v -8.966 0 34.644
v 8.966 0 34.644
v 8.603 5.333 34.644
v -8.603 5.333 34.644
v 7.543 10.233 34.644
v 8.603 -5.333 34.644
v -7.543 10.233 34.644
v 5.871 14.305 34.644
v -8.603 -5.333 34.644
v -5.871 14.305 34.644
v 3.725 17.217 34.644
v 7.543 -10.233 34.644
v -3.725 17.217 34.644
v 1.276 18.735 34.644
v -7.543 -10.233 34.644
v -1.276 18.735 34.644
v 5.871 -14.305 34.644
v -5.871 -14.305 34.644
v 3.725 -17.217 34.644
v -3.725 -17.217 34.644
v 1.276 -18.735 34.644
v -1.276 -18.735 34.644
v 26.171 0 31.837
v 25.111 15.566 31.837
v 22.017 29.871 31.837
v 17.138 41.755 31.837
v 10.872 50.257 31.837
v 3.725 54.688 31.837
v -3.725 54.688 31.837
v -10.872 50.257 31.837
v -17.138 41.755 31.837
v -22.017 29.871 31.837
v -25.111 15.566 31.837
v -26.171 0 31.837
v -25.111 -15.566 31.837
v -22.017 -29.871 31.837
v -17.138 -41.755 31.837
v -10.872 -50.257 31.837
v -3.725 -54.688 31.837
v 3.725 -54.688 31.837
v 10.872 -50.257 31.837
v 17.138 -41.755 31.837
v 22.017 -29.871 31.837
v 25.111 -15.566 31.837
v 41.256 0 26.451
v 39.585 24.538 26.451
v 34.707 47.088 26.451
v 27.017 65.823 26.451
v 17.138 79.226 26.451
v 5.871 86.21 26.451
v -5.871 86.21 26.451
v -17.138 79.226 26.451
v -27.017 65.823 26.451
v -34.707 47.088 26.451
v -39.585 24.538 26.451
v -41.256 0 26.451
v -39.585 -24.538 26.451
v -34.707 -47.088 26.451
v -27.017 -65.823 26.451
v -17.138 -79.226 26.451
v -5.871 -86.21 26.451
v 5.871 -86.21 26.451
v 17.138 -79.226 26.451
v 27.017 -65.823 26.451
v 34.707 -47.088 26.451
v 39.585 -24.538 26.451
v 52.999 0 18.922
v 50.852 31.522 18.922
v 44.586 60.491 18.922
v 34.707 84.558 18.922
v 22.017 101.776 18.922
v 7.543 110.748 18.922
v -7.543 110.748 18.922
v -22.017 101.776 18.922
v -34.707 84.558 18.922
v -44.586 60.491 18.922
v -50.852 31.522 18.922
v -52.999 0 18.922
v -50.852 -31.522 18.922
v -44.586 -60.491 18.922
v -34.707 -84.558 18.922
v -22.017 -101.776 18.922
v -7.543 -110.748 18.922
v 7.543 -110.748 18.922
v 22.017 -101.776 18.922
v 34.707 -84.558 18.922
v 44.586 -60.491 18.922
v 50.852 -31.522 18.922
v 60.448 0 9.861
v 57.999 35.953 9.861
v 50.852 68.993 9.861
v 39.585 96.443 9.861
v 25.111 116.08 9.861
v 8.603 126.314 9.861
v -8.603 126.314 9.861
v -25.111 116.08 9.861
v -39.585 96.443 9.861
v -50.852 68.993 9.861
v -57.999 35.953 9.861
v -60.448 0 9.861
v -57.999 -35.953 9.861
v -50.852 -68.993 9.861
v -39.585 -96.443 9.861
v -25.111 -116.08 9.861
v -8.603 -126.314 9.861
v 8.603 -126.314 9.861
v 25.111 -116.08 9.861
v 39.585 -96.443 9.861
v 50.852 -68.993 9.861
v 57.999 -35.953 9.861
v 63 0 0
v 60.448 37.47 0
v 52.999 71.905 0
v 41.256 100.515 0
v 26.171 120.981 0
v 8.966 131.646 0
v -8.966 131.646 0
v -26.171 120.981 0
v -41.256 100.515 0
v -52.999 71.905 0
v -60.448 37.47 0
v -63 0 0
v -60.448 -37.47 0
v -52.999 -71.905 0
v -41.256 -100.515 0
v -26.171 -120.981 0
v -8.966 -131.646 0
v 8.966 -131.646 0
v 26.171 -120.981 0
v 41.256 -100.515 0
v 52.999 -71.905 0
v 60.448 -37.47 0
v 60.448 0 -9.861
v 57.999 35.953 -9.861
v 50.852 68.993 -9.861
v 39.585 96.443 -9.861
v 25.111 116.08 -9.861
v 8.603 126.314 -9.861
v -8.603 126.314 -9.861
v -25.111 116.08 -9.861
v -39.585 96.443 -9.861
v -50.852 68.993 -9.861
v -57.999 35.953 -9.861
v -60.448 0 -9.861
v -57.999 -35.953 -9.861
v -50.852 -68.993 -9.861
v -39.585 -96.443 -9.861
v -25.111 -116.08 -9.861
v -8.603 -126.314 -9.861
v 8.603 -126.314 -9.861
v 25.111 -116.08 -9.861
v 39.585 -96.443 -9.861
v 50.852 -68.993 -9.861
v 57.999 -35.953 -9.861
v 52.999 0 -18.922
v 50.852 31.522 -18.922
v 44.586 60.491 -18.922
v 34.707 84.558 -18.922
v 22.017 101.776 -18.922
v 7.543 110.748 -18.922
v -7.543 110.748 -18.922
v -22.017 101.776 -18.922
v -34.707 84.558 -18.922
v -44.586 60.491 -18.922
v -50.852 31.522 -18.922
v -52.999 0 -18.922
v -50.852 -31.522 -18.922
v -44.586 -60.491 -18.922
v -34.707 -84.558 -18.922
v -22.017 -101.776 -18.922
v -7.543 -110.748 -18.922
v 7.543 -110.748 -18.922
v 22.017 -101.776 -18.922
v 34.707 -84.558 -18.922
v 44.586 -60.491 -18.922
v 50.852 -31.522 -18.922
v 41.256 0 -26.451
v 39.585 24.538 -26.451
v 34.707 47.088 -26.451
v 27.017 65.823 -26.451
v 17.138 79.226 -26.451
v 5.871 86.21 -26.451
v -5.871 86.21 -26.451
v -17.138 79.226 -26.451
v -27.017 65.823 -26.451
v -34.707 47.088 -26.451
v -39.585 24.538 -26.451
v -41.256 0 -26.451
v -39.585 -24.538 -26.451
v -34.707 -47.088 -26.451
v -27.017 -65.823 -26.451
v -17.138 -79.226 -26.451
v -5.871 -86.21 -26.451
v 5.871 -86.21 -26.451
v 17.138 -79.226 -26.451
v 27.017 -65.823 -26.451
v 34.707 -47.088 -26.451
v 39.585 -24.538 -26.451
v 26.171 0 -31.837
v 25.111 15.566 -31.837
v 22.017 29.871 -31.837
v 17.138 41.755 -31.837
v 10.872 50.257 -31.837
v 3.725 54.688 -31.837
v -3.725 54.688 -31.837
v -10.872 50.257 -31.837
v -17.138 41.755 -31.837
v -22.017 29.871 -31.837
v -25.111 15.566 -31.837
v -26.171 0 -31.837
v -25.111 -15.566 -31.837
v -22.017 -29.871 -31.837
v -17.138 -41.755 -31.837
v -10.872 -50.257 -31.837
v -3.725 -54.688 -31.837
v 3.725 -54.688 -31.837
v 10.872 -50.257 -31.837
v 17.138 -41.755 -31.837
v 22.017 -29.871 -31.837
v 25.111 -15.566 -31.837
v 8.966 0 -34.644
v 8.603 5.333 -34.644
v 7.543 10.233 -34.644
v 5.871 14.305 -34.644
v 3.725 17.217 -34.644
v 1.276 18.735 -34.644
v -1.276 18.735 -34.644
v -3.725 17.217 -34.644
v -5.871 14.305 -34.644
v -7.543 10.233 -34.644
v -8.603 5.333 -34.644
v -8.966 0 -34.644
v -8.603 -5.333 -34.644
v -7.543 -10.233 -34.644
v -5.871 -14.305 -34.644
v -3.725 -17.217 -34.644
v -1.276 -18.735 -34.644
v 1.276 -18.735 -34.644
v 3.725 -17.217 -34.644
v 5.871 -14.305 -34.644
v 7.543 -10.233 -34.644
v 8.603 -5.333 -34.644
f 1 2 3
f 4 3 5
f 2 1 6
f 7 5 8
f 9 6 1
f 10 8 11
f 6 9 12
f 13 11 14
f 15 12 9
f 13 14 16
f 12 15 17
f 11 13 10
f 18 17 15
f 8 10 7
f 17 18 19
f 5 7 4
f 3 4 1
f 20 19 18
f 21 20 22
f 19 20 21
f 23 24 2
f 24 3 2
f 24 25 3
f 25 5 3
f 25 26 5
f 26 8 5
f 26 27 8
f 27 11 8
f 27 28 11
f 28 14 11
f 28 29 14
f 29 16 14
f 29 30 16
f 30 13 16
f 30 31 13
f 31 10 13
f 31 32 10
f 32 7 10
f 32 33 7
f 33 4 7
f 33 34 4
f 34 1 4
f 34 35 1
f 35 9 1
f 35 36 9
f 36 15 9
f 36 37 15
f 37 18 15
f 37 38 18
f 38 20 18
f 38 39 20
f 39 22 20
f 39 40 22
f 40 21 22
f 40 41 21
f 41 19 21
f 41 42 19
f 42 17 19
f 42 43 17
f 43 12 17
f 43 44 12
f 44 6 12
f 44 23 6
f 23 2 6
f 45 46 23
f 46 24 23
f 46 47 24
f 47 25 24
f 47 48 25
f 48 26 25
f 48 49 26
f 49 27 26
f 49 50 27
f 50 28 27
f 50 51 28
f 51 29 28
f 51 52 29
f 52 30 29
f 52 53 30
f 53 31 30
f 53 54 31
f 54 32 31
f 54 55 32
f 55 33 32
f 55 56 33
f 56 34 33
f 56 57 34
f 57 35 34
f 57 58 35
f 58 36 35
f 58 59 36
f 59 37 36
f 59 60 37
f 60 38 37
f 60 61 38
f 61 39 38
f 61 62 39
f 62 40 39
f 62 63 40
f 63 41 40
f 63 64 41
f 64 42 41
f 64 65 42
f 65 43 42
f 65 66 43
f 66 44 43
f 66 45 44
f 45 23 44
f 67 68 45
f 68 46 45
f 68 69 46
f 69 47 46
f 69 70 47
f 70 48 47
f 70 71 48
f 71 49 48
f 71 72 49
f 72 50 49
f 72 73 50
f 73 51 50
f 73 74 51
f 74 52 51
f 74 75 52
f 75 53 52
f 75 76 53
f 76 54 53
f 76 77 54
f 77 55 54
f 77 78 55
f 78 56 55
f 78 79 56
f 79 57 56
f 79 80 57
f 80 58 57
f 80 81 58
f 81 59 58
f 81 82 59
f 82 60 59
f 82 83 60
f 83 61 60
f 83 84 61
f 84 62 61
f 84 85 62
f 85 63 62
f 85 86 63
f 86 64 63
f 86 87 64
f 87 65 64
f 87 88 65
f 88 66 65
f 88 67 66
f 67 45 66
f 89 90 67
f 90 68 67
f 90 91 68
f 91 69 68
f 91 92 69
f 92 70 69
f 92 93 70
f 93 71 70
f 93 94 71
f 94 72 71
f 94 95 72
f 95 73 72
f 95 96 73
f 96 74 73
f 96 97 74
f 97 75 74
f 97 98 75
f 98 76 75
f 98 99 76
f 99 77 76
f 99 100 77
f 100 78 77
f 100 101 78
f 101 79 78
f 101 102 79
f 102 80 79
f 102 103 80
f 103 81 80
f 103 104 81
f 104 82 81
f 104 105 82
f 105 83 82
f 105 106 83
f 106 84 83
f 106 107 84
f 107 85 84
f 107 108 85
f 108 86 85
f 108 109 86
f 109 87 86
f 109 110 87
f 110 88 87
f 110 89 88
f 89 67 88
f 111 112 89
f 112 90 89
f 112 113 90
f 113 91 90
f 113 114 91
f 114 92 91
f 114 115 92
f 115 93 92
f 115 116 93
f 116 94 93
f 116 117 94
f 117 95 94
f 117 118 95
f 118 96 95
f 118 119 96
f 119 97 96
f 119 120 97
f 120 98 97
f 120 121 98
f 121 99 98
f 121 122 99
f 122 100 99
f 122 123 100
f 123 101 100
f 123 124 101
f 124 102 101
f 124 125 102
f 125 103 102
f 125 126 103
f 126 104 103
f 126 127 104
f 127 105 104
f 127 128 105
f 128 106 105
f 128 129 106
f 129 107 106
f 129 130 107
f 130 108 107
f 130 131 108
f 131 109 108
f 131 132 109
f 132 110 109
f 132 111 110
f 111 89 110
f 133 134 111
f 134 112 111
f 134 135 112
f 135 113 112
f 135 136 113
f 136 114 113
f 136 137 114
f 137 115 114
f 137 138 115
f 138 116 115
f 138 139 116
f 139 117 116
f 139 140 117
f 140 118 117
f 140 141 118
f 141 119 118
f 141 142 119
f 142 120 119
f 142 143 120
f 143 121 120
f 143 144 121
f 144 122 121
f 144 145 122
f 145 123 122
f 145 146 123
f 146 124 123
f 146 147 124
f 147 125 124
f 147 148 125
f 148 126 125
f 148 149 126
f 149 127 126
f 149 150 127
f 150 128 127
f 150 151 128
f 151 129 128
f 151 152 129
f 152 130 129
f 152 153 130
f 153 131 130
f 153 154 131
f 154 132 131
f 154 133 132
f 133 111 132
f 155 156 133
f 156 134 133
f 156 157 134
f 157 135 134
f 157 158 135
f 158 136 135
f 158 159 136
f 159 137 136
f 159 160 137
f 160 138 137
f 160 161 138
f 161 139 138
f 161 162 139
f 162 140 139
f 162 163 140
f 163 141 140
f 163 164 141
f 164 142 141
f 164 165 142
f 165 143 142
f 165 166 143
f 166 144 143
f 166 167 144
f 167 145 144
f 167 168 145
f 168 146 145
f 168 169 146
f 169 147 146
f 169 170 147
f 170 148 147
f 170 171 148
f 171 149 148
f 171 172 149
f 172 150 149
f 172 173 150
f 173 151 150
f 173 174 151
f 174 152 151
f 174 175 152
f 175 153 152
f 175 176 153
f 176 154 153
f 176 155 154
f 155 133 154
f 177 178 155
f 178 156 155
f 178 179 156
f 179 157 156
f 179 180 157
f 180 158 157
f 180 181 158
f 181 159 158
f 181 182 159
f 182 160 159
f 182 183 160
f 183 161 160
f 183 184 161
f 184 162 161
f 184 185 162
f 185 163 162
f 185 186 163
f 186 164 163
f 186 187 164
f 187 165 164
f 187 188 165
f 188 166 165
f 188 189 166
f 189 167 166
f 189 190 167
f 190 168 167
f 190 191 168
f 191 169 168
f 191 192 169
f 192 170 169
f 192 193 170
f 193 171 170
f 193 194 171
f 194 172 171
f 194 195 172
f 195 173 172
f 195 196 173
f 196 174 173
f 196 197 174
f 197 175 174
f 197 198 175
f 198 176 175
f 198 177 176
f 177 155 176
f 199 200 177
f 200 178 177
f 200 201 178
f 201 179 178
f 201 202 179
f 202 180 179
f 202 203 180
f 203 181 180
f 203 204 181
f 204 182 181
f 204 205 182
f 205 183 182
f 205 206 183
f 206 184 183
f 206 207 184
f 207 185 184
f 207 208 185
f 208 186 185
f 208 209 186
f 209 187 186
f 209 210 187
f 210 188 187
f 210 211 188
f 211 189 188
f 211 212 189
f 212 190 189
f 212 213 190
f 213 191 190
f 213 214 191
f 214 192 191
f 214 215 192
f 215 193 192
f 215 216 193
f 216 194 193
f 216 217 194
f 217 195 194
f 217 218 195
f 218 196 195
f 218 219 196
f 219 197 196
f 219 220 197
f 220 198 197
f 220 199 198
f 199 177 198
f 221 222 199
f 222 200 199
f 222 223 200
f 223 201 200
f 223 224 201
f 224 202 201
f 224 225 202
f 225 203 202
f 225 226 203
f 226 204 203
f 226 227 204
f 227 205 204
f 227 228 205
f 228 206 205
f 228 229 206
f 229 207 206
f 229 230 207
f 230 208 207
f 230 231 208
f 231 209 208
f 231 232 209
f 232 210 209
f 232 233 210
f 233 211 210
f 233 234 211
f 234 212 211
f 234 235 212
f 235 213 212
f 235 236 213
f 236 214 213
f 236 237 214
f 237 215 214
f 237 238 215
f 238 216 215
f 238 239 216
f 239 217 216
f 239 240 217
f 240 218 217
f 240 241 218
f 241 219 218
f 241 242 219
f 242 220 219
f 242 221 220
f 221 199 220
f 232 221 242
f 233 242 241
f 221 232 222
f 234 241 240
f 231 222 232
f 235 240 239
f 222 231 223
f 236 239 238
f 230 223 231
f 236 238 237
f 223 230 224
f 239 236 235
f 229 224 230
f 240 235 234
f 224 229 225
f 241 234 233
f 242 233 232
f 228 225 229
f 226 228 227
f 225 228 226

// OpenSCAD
// Generated by SolidPython 1.0.1 on 2020-07-29 00:46:49


scale(v = [9, 19, 5]) {
	sphere(r = 7);
}
/***********************************************
*********      SolidPython code:      **********
************************************************
 
# import packages: SolidPython
from solid import *
from solid.utils import *
from itertools import chain, combinations, permutations


class Resize:

    def __init__(self, scad_file):
        self.scad_file = scad_file
        #self.scad_file = import_scad(scad_file)
        # cone/cylinder param:
        self.r1 = 0
        self.r2 = 0
        self.h = 0
        # rectangular prism param:
        self.w = 0
        self.l = 0
        # ellipse param:
        self.r = 0

    # import OpenScad code (file name corresponds to shape)


    # classify shape + parameters
    def assign(self, param1, param2, param3):
        if self.scad_file == 'cone.scad':
            self.r1 = param1
            self.r2 = param2
            self.h = param3
        elif self.scad_file == 'cylinder.scad':
            self.r1 = param1
            self.r2 = param2
            self.h = param3
        elif self.scad_file == 'rectangularPrism.scad':
            self.h = param1
            self.l = param2
            self.w = param3
        else:
            self.r = param1
            self.h = param2

    # resize parameters
    def iterate(self):
        x = range(3, 20, 2)
        i = 1
        if self.scad_file == 'cone.scad':
            tempList = list(permutations(x, 2))
            for temp in tempList:
                param1 = temp[0]
                param2 = temp[1]
                filepath = 'produced_scad_files/' + 'cone' + str(param1) + '_' + str(param2) + '_' + '.scad'
                scad_render_to_file(cylinder(h=param1, r1=param2, r2=0), filepath)

        elif self.scad_file == 'cylinder.scad':
            tempList = list(permutations(x, 3))
            for temp in tempList:
                param1 = temp[0]
                param2 = temp[1]
                filepath = 'produced_scad_files/' + 'cylinder' + str(param1) + '_' + str(param2) + '_' + '.scad'
                scad_render_to_file(cylinder(h=param1, r1=param2, r2=param2), filepath)

        elif self.scad_file == 'rectangularPrism.scad':
            tempList = list(permutations(x, 3))
            for temp in tempList:
                param1 = temp[0]
                param2 = temp[1]
                param3 = temp[2]
                filepath = 'produced_scad_files/' + 'rectangularPrism' + str(param1) + '_' + str(param2) + '_' + str(
                    param3) + '.scad'
                scad_render_to_file(cube(size=(param1, param2, param3)), filepath)

        elif self.scad_file == 'ellipse.scad':
            tempList = list(permutations(x, 4))
            for temp in tempList:
                param1 = temp[0]
                param2 = temp[1]
                param3 = temp[2]
                param4 = temp[3]
                filepath = 'produced_scad_files/' + 'ellipse' + str(param1) + '_' + str(param2) + '_' + str(param3) + '_' + str(param4) + '.scad'
                scad_render_to_file(scale([param1, param2, param3])(sphere(r=param4)), filepath)

    def render_to_scadfile(self):
        scad_render_to_file(scad, 'example.scad') 
 
************************************************/
